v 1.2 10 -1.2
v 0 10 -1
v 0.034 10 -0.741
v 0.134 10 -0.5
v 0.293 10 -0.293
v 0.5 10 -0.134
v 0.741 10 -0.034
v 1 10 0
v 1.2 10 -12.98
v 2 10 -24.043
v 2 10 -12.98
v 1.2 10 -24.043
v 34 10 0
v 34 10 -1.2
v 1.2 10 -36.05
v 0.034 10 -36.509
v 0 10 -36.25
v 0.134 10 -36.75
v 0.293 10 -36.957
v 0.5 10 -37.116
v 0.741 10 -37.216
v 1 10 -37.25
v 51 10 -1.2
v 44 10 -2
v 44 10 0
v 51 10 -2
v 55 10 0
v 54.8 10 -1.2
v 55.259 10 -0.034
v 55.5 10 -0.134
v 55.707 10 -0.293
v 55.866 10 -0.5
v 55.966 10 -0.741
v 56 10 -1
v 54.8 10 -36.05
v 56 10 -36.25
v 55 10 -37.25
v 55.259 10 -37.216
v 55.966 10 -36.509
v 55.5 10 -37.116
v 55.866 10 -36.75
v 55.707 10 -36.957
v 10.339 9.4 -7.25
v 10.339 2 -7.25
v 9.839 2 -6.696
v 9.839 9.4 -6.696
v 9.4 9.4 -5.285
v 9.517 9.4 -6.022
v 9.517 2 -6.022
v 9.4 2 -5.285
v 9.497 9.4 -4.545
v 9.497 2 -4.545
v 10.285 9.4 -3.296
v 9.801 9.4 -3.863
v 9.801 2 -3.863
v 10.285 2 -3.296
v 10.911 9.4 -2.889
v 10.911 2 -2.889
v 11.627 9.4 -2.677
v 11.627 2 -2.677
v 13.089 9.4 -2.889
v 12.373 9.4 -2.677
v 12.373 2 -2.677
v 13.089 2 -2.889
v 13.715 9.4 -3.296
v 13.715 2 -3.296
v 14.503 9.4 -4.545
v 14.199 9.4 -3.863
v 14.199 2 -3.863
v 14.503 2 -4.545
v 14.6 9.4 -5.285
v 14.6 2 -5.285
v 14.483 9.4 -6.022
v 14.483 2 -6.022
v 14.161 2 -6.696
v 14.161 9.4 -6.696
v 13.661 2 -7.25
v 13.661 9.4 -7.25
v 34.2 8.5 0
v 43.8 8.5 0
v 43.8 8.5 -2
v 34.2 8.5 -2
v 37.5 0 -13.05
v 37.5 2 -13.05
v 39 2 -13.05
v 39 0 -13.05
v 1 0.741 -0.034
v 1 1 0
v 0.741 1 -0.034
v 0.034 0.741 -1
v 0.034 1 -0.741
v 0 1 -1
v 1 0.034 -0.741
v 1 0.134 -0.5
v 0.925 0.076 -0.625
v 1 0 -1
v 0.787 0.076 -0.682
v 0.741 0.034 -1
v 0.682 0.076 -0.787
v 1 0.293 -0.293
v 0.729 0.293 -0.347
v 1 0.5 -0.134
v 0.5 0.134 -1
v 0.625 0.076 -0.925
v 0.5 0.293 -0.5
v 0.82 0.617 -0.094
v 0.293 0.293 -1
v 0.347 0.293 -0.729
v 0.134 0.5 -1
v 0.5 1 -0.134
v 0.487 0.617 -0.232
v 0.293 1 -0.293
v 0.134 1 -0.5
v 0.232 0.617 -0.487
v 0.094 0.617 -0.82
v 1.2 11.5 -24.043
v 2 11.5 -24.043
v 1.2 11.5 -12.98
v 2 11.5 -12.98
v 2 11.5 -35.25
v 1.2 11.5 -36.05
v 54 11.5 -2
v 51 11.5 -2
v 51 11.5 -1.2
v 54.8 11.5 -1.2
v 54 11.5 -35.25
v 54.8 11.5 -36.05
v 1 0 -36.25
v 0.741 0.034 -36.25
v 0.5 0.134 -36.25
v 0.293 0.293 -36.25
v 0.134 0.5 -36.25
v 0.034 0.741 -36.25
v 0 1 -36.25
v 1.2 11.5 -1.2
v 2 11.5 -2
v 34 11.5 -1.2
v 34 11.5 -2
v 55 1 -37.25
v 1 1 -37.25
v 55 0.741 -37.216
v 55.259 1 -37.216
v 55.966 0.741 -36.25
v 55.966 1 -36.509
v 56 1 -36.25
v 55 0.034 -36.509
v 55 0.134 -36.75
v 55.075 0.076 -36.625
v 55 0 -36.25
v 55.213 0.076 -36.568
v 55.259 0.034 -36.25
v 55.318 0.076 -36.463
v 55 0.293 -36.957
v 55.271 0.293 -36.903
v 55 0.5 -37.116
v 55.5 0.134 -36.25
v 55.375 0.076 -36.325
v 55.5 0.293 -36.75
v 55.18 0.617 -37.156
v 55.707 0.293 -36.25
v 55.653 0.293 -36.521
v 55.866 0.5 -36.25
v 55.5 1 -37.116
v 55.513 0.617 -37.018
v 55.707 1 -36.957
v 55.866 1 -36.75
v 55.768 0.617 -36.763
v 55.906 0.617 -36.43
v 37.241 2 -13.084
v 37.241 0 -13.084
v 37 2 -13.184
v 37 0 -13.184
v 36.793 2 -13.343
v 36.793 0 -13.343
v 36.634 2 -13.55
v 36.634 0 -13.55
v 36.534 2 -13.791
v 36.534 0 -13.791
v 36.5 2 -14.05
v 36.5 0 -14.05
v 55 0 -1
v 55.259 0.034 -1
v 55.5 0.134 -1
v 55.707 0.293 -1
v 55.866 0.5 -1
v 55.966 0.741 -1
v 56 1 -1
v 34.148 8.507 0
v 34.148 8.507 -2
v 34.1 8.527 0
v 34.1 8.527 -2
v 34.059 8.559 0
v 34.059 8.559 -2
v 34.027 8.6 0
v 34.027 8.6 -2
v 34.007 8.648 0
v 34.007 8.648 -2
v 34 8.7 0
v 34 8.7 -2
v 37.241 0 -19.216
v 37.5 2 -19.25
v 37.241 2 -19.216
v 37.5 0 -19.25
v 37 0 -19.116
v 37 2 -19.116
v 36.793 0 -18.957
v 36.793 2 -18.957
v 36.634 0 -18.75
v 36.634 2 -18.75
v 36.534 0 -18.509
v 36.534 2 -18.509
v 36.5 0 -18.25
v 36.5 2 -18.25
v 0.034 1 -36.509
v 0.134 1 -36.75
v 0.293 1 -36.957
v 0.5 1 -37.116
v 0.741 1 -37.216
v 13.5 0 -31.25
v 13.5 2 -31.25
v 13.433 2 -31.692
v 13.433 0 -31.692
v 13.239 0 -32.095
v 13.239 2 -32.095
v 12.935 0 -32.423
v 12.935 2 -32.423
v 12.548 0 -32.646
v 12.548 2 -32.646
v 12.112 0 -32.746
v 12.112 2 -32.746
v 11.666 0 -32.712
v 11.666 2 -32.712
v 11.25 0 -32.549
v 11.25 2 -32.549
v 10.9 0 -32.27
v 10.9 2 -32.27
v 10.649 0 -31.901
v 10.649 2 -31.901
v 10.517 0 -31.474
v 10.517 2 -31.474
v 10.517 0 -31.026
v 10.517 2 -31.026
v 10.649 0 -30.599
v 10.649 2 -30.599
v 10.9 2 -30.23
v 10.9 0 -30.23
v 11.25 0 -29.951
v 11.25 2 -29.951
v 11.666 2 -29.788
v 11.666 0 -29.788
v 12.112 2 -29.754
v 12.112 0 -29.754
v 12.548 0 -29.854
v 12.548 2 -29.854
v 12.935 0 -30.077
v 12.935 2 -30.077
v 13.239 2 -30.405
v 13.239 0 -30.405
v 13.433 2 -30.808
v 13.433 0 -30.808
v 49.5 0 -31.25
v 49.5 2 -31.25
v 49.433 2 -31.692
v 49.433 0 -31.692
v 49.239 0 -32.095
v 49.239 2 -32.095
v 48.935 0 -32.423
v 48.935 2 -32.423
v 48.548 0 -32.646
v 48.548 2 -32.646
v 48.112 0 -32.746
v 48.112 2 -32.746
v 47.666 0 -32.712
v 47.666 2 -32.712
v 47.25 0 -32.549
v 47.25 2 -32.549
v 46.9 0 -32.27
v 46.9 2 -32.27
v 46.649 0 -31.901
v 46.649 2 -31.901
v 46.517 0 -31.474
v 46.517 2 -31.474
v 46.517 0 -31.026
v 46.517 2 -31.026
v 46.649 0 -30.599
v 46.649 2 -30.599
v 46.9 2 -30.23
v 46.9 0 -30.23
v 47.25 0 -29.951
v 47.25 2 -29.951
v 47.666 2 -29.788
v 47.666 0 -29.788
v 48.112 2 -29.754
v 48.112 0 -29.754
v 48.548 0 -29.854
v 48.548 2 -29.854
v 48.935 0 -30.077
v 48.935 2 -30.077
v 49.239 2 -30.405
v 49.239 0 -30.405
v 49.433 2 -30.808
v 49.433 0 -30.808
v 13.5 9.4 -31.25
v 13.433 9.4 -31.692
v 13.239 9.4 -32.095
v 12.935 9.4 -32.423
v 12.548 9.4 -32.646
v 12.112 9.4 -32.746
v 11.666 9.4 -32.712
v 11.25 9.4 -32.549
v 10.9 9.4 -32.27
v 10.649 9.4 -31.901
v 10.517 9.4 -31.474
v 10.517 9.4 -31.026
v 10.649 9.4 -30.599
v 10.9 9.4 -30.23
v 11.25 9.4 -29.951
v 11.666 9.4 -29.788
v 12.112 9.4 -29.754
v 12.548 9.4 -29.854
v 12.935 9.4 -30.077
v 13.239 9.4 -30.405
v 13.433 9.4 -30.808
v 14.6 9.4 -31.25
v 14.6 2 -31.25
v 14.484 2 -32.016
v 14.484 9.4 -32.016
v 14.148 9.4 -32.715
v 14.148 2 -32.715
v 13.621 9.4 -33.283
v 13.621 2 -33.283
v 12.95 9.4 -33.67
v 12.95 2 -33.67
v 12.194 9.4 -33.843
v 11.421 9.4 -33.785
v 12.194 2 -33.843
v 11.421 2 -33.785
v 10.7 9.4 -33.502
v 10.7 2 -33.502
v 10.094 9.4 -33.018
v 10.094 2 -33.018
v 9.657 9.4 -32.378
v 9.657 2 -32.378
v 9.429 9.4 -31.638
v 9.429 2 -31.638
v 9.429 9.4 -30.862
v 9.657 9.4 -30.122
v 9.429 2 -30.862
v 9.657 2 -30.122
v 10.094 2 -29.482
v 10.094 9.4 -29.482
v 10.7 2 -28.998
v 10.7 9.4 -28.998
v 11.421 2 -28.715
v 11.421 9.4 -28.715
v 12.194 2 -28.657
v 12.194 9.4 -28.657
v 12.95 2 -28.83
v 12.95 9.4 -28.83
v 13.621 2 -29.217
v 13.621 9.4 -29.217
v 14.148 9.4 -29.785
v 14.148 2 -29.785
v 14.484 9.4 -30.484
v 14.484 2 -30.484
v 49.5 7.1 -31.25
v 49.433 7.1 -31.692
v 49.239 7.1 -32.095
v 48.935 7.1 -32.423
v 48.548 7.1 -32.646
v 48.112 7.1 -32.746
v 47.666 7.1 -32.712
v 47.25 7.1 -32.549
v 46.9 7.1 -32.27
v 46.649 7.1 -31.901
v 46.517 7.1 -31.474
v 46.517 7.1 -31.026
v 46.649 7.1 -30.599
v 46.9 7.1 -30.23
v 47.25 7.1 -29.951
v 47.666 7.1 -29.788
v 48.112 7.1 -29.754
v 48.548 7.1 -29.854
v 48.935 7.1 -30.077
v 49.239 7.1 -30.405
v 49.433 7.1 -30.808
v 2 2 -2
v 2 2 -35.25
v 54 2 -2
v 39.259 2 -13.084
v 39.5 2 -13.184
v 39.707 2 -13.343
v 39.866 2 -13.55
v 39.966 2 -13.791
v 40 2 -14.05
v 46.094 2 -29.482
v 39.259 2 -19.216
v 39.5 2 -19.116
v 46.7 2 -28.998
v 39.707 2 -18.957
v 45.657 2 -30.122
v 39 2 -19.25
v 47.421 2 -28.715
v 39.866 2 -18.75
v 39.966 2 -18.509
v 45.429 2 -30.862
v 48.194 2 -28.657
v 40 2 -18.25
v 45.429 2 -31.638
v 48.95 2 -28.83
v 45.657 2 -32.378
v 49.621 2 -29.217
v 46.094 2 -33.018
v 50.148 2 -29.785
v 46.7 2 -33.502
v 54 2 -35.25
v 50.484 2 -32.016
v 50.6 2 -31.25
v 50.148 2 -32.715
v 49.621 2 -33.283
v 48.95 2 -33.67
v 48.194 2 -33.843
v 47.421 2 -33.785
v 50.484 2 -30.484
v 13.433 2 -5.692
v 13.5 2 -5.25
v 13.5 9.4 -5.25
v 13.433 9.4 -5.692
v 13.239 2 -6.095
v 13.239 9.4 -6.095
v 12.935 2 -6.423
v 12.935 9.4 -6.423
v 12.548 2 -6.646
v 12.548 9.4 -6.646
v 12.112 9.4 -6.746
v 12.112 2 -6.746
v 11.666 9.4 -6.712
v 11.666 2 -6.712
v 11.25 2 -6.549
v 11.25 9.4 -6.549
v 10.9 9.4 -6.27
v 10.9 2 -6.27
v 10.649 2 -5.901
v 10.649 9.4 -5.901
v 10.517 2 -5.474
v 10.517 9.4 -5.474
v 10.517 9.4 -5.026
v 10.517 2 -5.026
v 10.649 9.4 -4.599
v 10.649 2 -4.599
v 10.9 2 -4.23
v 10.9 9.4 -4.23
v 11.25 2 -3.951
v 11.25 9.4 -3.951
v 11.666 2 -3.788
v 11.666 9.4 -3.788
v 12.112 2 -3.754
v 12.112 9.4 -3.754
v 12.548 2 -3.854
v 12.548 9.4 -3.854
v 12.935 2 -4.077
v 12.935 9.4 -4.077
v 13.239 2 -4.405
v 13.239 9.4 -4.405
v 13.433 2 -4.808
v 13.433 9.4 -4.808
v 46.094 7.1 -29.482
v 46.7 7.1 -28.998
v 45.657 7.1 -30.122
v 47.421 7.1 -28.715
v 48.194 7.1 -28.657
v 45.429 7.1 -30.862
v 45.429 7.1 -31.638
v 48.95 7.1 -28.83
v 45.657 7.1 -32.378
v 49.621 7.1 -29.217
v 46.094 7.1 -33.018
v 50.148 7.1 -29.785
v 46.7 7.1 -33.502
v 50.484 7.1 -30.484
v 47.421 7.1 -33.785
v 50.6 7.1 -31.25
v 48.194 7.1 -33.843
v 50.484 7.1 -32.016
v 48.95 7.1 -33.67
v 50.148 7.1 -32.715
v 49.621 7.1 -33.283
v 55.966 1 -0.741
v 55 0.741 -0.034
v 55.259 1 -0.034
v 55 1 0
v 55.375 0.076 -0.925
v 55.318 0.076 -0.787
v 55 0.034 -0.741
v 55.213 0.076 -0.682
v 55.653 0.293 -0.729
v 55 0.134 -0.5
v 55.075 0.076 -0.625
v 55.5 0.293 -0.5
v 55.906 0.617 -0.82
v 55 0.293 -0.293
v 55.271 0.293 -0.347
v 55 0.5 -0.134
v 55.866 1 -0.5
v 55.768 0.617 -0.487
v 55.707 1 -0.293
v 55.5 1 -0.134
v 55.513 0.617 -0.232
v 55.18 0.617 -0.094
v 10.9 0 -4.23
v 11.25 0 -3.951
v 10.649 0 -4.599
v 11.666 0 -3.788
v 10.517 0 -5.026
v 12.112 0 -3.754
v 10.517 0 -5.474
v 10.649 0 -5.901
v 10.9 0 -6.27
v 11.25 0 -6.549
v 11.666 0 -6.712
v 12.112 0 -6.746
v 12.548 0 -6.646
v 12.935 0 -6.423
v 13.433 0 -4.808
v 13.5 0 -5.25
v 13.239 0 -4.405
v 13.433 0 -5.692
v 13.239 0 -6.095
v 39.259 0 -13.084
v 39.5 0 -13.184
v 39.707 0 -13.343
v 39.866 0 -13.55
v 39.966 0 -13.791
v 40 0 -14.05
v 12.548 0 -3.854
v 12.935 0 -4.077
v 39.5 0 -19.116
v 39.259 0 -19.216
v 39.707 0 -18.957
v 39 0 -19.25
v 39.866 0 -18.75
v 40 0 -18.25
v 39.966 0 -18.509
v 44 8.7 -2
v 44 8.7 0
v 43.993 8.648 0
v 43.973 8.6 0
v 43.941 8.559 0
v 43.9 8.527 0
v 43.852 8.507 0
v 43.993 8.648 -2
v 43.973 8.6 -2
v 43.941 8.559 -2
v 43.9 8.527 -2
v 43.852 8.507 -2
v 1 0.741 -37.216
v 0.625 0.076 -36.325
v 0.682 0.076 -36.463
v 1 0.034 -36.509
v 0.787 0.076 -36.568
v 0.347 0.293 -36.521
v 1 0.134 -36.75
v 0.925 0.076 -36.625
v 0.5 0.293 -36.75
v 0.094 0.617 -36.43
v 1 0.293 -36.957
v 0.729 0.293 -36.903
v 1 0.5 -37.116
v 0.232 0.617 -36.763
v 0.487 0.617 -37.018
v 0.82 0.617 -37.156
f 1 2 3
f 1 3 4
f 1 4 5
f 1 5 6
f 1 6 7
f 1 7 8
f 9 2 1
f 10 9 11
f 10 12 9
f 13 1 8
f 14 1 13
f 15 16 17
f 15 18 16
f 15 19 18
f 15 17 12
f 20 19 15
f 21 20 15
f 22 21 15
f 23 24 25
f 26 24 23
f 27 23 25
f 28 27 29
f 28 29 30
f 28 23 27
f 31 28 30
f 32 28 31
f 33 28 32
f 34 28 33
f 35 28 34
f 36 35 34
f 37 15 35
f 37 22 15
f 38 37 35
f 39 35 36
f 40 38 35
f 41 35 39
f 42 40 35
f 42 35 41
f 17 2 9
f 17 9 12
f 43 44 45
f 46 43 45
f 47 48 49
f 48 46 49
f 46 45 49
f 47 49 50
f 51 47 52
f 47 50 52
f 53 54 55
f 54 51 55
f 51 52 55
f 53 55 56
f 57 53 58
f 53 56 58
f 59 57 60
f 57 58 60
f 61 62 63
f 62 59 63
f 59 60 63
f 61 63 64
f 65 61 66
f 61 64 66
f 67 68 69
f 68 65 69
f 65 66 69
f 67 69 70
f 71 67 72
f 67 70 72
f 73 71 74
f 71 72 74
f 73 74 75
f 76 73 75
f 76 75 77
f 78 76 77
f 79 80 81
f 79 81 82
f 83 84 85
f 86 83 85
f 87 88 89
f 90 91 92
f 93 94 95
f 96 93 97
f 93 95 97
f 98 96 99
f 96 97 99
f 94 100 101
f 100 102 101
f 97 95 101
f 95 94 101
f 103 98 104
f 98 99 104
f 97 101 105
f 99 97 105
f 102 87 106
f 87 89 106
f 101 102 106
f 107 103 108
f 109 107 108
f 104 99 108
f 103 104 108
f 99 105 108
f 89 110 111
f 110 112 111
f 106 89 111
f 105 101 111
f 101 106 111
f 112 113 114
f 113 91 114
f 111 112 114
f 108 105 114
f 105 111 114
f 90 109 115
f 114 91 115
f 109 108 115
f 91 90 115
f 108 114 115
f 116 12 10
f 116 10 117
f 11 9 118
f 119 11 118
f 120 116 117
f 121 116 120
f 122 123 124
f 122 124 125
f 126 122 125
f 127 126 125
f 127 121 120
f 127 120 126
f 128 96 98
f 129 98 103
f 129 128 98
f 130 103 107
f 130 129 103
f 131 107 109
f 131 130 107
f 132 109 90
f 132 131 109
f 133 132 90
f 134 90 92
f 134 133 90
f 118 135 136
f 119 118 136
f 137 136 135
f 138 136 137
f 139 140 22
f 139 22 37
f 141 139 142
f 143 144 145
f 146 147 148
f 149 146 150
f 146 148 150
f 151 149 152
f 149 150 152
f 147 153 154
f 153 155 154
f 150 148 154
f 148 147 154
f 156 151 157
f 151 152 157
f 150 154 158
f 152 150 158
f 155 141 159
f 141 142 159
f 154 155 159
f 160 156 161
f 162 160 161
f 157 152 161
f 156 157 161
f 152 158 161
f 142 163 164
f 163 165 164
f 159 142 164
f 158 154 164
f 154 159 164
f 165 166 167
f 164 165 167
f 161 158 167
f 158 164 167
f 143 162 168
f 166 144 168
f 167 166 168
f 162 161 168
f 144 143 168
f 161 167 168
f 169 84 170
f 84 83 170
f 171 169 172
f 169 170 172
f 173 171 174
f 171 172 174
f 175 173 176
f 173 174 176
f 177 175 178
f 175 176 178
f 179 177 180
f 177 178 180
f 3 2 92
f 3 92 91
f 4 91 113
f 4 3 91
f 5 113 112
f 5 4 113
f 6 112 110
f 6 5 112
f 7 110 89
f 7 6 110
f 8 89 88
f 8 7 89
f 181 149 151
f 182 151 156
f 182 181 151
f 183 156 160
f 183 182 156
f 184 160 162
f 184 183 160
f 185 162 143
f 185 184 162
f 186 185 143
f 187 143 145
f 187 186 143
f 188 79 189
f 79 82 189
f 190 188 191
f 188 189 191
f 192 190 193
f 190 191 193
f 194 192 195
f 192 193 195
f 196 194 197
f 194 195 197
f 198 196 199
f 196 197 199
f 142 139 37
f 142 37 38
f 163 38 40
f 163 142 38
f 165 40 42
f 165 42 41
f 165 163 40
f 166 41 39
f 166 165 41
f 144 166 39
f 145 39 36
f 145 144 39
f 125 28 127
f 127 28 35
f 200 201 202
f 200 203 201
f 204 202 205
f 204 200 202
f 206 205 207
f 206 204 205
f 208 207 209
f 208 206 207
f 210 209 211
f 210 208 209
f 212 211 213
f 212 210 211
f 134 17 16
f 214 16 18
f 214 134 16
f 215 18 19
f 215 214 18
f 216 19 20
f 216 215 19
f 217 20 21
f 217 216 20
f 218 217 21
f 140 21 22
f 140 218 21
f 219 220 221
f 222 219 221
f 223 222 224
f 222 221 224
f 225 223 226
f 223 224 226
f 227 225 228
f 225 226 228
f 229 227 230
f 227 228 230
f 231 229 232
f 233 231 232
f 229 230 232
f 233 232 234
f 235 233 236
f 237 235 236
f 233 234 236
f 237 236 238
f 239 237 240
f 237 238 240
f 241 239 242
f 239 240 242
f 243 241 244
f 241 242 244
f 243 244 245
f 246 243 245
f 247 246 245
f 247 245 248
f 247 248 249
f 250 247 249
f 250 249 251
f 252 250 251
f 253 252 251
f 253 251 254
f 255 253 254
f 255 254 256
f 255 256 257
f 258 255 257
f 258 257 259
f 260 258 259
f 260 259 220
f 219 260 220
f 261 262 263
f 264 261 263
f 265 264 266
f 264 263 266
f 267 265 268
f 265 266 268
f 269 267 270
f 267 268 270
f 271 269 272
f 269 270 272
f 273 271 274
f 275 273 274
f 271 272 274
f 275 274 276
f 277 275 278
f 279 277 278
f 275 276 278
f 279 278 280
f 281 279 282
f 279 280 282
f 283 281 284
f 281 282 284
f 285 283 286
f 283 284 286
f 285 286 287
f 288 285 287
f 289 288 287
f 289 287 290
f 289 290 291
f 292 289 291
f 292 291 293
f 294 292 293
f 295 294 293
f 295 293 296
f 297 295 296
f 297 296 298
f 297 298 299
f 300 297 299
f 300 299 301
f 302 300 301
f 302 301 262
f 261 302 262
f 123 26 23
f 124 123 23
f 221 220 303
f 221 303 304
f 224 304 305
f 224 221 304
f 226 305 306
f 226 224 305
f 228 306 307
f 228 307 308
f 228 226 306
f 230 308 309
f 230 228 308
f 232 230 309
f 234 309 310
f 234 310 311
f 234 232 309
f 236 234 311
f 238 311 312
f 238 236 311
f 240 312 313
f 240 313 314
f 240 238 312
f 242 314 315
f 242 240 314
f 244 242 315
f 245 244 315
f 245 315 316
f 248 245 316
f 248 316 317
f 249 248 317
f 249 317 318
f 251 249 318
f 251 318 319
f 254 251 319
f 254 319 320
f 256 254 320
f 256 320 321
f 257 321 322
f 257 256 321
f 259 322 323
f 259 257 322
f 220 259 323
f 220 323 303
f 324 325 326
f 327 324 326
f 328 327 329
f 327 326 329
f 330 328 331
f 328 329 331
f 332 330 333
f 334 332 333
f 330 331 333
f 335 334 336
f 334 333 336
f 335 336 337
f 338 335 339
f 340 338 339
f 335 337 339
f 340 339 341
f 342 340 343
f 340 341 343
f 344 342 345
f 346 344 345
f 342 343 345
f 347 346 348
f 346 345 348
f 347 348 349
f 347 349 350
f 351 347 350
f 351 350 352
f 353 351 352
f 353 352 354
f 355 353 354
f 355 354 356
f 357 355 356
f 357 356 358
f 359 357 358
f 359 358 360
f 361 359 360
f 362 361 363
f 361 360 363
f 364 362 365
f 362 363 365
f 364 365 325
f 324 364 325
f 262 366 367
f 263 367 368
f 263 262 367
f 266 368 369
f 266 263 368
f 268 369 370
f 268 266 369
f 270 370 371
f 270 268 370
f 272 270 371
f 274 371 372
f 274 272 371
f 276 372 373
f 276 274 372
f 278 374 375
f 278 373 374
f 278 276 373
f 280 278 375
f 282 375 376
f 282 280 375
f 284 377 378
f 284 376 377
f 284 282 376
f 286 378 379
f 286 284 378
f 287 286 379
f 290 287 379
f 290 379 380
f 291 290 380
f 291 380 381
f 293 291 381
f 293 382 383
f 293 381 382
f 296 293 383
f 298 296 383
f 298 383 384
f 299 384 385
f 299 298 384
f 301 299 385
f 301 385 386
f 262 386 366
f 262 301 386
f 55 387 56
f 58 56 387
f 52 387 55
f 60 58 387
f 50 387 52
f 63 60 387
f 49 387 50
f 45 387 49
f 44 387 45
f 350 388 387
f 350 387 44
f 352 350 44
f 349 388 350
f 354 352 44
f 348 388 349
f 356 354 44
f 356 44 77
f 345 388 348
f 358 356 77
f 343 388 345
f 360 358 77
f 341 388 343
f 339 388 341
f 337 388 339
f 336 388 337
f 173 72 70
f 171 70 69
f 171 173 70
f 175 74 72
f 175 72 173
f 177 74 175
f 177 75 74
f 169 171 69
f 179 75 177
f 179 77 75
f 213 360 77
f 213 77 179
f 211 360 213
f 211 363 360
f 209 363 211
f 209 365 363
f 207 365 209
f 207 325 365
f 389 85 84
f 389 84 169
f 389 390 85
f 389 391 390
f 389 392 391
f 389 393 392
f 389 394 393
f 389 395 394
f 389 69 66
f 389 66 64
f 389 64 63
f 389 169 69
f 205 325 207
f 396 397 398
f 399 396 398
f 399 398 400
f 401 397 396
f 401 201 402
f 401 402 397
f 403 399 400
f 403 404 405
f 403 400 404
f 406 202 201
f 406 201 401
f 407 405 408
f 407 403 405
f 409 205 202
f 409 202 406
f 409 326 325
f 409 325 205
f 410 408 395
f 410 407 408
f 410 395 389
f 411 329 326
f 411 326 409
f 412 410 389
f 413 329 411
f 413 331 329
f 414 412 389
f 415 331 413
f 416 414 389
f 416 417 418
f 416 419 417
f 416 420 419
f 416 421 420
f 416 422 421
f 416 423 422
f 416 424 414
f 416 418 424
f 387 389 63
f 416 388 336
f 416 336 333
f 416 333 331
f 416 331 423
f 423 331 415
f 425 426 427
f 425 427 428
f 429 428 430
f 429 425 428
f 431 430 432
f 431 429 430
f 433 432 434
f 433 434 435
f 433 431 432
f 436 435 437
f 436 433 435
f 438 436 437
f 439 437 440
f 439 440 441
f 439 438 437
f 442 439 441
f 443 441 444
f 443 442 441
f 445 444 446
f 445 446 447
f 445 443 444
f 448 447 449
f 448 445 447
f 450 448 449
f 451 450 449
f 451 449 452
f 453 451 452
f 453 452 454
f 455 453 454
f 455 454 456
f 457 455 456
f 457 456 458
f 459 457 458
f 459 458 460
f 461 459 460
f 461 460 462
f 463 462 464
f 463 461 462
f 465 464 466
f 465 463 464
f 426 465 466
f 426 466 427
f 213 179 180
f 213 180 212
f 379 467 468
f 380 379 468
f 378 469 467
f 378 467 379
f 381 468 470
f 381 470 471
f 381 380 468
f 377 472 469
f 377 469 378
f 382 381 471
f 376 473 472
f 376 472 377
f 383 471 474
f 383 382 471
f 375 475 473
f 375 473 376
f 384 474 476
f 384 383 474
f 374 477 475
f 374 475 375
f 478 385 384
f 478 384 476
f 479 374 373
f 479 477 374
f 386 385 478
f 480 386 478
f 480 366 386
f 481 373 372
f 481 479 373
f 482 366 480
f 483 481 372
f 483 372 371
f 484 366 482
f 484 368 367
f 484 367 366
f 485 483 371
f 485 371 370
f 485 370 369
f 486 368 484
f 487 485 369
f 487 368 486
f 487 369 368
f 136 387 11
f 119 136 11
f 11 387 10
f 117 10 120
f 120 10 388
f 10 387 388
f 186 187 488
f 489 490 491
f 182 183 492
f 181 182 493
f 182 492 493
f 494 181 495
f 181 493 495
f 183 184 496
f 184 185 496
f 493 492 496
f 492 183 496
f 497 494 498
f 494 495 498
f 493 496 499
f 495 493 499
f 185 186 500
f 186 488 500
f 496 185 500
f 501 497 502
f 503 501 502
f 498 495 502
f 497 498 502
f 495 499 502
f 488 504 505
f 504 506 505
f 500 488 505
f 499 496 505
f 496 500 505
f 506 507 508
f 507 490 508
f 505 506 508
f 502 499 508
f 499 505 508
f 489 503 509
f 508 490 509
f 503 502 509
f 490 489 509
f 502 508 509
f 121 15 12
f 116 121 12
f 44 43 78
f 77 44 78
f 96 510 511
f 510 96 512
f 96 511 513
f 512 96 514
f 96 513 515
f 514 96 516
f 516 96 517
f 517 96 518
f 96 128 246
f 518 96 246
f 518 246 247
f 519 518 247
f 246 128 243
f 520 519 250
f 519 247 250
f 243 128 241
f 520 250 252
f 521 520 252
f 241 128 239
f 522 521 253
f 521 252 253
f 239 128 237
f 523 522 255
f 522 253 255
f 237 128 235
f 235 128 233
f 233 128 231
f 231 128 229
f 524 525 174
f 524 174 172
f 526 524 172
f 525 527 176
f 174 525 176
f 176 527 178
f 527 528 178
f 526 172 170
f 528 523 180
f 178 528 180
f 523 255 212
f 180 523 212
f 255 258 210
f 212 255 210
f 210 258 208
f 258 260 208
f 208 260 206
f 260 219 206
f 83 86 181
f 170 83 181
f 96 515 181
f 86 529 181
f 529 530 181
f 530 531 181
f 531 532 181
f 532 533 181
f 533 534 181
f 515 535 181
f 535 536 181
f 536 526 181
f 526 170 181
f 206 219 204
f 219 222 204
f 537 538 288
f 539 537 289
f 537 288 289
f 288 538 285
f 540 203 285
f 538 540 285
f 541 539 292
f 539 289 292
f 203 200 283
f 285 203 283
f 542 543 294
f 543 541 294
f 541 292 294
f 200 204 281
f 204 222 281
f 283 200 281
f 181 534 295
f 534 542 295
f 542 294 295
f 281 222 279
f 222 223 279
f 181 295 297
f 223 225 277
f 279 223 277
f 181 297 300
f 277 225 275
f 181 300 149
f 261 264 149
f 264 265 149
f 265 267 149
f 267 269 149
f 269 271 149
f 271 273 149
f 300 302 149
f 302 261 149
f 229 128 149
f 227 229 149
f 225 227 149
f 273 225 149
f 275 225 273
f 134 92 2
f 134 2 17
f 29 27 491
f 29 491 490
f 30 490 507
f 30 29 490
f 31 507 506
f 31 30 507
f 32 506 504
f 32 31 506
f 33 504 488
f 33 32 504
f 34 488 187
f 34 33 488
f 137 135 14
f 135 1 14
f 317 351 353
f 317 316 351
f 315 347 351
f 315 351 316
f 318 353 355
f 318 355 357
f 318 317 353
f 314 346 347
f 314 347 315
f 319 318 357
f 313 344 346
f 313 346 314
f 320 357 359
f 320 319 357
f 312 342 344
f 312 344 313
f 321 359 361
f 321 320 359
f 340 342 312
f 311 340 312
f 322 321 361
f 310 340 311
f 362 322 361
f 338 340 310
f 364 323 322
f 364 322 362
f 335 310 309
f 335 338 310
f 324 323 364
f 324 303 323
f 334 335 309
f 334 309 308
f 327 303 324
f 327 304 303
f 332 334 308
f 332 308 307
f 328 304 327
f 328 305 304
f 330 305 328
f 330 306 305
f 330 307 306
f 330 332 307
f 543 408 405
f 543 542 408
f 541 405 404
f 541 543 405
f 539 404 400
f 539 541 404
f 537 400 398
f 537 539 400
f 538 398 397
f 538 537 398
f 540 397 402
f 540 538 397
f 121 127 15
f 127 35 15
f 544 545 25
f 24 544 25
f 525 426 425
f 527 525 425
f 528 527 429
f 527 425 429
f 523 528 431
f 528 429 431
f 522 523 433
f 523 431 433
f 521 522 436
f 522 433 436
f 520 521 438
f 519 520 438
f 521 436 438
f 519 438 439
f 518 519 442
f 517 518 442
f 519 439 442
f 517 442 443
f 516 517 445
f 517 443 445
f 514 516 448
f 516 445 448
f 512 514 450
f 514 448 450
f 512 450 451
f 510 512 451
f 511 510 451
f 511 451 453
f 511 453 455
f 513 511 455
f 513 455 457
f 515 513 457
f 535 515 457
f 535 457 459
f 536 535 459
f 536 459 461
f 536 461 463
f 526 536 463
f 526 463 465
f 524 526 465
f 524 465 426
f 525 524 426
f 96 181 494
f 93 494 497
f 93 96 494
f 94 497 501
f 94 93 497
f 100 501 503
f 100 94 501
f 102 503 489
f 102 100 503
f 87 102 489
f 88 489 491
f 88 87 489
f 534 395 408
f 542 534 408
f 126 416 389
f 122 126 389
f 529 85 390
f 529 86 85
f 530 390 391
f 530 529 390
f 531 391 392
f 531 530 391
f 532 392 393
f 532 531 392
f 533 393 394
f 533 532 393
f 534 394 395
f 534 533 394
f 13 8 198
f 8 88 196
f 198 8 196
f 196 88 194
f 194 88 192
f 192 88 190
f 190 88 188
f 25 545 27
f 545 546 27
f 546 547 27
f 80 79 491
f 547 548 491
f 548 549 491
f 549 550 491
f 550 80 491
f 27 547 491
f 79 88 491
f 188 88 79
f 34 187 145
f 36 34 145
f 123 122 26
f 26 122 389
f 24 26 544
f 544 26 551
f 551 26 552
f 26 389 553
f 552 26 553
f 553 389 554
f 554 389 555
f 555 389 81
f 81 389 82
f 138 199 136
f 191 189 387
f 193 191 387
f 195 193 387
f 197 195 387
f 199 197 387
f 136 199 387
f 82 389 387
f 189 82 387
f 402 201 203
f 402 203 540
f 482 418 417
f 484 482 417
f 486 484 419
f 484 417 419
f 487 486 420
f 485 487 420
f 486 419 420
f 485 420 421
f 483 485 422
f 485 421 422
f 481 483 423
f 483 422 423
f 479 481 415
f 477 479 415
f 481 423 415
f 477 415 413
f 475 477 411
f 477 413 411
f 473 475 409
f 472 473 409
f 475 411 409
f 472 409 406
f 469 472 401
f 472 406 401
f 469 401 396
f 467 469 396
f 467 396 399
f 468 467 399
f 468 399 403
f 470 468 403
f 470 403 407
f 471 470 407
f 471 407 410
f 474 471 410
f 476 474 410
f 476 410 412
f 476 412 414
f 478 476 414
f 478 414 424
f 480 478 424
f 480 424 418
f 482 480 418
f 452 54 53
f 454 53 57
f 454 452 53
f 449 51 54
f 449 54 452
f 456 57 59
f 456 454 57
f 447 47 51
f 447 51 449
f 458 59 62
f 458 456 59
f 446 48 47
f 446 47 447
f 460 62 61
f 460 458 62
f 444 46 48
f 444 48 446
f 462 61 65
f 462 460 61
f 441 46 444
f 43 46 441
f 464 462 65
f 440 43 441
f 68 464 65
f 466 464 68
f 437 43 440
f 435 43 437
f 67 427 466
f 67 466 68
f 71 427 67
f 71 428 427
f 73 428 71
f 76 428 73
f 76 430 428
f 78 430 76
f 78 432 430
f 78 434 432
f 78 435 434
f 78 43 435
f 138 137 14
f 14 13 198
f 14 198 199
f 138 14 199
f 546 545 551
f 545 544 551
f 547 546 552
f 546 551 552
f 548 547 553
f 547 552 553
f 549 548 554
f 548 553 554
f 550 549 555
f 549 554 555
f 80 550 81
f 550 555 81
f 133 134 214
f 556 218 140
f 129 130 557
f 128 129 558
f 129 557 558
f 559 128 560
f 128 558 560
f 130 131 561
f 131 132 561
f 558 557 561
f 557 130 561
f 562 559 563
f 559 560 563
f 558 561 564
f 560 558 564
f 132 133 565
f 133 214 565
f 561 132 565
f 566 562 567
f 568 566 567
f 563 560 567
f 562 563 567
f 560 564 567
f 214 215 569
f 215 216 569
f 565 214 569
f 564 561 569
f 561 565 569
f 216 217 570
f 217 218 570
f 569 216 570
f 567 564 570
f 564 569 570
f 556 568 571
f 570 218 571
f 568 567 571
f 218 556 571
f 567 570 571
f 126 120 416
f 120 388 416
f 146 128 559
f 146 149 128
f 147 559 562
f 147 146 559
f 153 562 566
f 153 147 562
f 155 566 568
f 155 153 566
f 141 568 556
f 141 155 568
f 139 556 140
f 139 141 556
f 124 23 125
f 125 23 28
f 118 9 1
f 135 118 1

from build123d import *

# Parameters (mm, degrees)
SKETCH1_W           = 56
SKETCH1_H           = 37.25
BOSS_EXTRUDE1_DEPTH = 2
SKETCH2_W           = 56
SKETCH2_H           = 37.25
SKETCH2_W_2         = 52
SKETCH2_H_2         = 33.25
BOSS_EXTRUDE2_DEPTH = 9
SKETCH3_R           = 2.6
SKETCH3_R_2         = 1.5
BOSS_EXTRUDE3_DEPTH = 7.4
SKETCH5_W           = 56
SKETCH5_H           = 37.25
SKETCH5_W_2         = 53.6
SKETCH5_H_2         = 34.85
CUT_EXTRUDE1_DEPTH  = 1
FILLET1_R           = 1
SKETCH7_R           = 1.5
CUT_EXTRUDE2_DEPTH  = 10
CUT_EXTRUDE3_DEPTH  = 3
FILLET2_R           = 1
CUT_EXTRUDE4_DEPTH  = 7.4
SKETCH10_W          = 3.5
SKETCH10_H          = 6.2
CUT_EXTRUDE5_DEPTH  = 10
FILLET3_R           = 1
SKETCH11_W          = 7
SKETCH11_H          = 1
CUT_EXTRUDE6_DEPTH  = 10
FILLET4_R           = 0.2
BOSS_EXTRUDE6_DEPTH = 0.5
SKETCH13_W          = 11.063396545
SKETCH13_H          = 1.5
CUT_EXTRUDE9_DEPTH  = 2
SKETCH14_R          = 2.6
CUT_EXTRUDE10_DEPTH = 2.3


with BuildPart() as part:
    # Sketch1 → Boss-Extrude1 (new body)
    with BuildSketch(Plane(origin=(0, 0, 0), x_dir=(1, 0, 0), z_dir=(0, 1, 0))):
        with Locations((28, 18.625)):
            Rectangle(SKETCH1_W, SKETCH1_H)
    extrude(amount=BOSS_EXTRUDE1_DEPTH)

    # Sketch2 → Boss-Extrude2 (add)
    with BuildSketch(Plane(origin=(0, 2, 0), x_dir=(1, 0, 0), z_dir=(0, 1, 0))):
        with Locations((28, 18.625)):
            Rectangle(SKETCH2_W, SKETCH2_H)
        with Locations((28, 18.625)):
            Rectangle(SKETCH2_W_2, SKETCH2_H_2, mode=Mode.SUBTRACT)
    extrude(amount=BOSS_EXTRUDE2_DEPTH)

    # Sketch3 → Boss-Extrude3 (add)
    with BuildSketch(Plane(origin=(0, 2, 0), x_dir=(1, 0, 0), z_dir=(0, 1, 0))):
        with Locations((12, 5.25)):
            Circle(SKETCH3_R)
        with Locations((12, 5.25)):
            Circle(SKETCH3_R_2, mode=Mode.SUBTRACT)
        with Locations((12, 31.25)):
            Circle(SKETCH3_R)
        with Locations((12, 31.25)):
            Circle(SKETCH3_R_2, mode=Mode.SUBTRACT)
        with Locations((48, 31.25)):
            Circle(SKETCH3_R)
        with Locations((48, 31.25)):
            Circle(SKETCH3_R_2, mode=Mode.SUBTRACT)
    extrude(amount=BOSS_EXTRUDE3_DEPTH)

    # Sketch5 → Cut-Extrude1 (cut)
    with BuildSketch(Plane(origin=(0, 11, 0), x_dir=(1, 0, 0), z_dir=(0, 1, 0))):
        with Locations((28, 18.625)):
            Rectangle(SKETCH5_W, SKETCH5_H)
        with Locations((28, 18.625)):
            Rectangle(SKETCH5_W_2, SKETCH5_H_2, mode=Mode.SUBTRACT)
    extrude(amount=-CUT_EXTRUDE1_DEPTH, mode=Mode.SUBTRACT)

    # Fillet1
    fillet1_edges = [part.edges().sort_by_distance(p)[0] for p in [
        (0, 5, -37.25),
        (56, 5, -37.25),
        (56, 5, 0),
        (0, 5, 0),
    ]]
    fillet(fillet1_edges, radius=FILLET1_R)

    # Sketch7 → Cut-Extrude2 (cut)
    with BuildSketch(Plane(origin=(0, 2, 0), x_dir=(1, 0, 0), z_dir=(0, 1, 0))):
        with Locations((12, 5.25)):
            Circle(SKETCH7_R)
        with Locations((48, 31.25)):
            Circle(SKETCH7_R)
        with Locations((12, 31.25)):
            Circle(SKETCH7_R)
    extrude(amount=-CUT_EXTRUDE2_DEPTH, mode=Mode.SUBTRACT)

    # Sketch8 → Cut-Extrude3 (cut)
    with BuildSketch(Plane.XY):
        Polygon((44, 10), (44, 8.5), (34, 8.5), (34, 10), (34, 11), (44, 11), align=None)
    extrude(amount=-CUT_EXTRUDE3_DEPTH, mode=Mode.SUBTRACT)

    # Fillet2
    fillet2_edges = [part.edges().sort_by_distance(p)[0] for p in [
        (28, 0, -37.25),
        (0, 0, -18.625),
        (56, 0, -18.625),
        (28, 0, 0),
        (0.292893219, 0, -0.292893219),
        (0.292893219, 0, -36.957106781),
        (55.707106781, 0, -0.292893219),
        (55.707106781, 0, -36.957106781),
    ]]
    fillet(fillet2_edges, radius=FILLET2_R)

    # Sketch9 → Cut-Extrude4 (cut)
    with BuildSketch(Plane(origin=(0, 9.4, 0), x_dir=(1, 0, 0), z_dir=(0, 1, 0))):
        with BuildLine():
            Line((12, 7.25), (13.661324773, 7.25))
            ThreePointArc((13.661324773, 7.25), (12, 7.85), (10.338675227, 7.25))
            Line((10.338675227, 7.25), (12, 7.25))
        make_face()
    extrude(amount=-CUT_EXTRUDE4_DEPTH, mode=Mode.SUBTRACT)

    # Sketch10 → Cut-Extrude5 (cut)
    with BuildSketch(Plane(origin=(0, 2, 0), x_dir=(1, 0, 0), z_dir=(0, 1, 0))):
        with Locations((38.25, 16.15)):
            Rectangle(SKETCH10_W, SKETCH10_H)
    extrude(amount=-CUT_EXTRUDE5_DEPTH, mode=Mode.SUBTRACT)

    # Fillet3
    fillet3_edges = [part.edges().sort_by_distance(p)[0] for p in [
        (36.5, 1, -13.05),
        (36.5, 1, -19.25),
        (40, 1, -19.25),
        (40, 1, -13.05),
    ]]
    fillet(fillet3_edges, radius=FILLET3_R)

    # Sketch11 → Cut-Extrude6 (cut)
    with BuildSketch(Plane.XY.offset(-1.2)):
        with Locations((47.5, 10.5)):
            Rectangle(SKETCH11_W, SKETCH11_H)
    extrude(amount=-CUT_EXTRUDE6_DEPTH, mode=Mode.SUBTRACT)

    # Fillet4
    fillet4_edges = [part.edges().sort_by_distance(p)[0] for p in [
        (44, 8.5, -1),
        (34, 8.5, -1),
    ]]
    fillet(fillet4_edges, radius=FILLET4_R)

    # Sketch12 → Boss-Extrude6 (add)
    with BuildSketch(Plane(origin=(0, 11, 0), x_dir=(1, 0, 0), z_dir=(0, 1, 0))):
        Polygon((51, 2), (51, 1.2), (54.8, 1.2), (54.8, 36.05), (1.2, 36.05), (1.2, 1.2), (34, 1.2), (34, 2), (2, 2), (2, 35.25), (54, 35.25), (54, 2), align=None)
    extrude(amount=BOSS_EXTRUDE6_DEPTH)

    # Sketch13 → Cut-Extrude9 (cut)
    with BuildSketch(Plane.ZY.offset(-1.2)):
        with Locations((-18.511698272, 10.75)):
            Rectangle(SKETCH13_W, SKETCH13_H)
    extrude(amount=-CUT_EXTRUDE9_DEPTH, mode=Mode.SUBTRACT)

    # Sketch14 → Cut-Extrude10 (cut)
    with BuildSketch(Plane(origin=(0, 9.4, 0), x_dir=(1, 0, 0), z_dir=(0, 1, 0))):
        with Locations((48, 31.25)):
            Circle(SKETCH14_R)
    extrude(amount=-CUT_EXTRUDE10_DEPTH, mode=Mode.SUBTRACT)


solid = part.part
